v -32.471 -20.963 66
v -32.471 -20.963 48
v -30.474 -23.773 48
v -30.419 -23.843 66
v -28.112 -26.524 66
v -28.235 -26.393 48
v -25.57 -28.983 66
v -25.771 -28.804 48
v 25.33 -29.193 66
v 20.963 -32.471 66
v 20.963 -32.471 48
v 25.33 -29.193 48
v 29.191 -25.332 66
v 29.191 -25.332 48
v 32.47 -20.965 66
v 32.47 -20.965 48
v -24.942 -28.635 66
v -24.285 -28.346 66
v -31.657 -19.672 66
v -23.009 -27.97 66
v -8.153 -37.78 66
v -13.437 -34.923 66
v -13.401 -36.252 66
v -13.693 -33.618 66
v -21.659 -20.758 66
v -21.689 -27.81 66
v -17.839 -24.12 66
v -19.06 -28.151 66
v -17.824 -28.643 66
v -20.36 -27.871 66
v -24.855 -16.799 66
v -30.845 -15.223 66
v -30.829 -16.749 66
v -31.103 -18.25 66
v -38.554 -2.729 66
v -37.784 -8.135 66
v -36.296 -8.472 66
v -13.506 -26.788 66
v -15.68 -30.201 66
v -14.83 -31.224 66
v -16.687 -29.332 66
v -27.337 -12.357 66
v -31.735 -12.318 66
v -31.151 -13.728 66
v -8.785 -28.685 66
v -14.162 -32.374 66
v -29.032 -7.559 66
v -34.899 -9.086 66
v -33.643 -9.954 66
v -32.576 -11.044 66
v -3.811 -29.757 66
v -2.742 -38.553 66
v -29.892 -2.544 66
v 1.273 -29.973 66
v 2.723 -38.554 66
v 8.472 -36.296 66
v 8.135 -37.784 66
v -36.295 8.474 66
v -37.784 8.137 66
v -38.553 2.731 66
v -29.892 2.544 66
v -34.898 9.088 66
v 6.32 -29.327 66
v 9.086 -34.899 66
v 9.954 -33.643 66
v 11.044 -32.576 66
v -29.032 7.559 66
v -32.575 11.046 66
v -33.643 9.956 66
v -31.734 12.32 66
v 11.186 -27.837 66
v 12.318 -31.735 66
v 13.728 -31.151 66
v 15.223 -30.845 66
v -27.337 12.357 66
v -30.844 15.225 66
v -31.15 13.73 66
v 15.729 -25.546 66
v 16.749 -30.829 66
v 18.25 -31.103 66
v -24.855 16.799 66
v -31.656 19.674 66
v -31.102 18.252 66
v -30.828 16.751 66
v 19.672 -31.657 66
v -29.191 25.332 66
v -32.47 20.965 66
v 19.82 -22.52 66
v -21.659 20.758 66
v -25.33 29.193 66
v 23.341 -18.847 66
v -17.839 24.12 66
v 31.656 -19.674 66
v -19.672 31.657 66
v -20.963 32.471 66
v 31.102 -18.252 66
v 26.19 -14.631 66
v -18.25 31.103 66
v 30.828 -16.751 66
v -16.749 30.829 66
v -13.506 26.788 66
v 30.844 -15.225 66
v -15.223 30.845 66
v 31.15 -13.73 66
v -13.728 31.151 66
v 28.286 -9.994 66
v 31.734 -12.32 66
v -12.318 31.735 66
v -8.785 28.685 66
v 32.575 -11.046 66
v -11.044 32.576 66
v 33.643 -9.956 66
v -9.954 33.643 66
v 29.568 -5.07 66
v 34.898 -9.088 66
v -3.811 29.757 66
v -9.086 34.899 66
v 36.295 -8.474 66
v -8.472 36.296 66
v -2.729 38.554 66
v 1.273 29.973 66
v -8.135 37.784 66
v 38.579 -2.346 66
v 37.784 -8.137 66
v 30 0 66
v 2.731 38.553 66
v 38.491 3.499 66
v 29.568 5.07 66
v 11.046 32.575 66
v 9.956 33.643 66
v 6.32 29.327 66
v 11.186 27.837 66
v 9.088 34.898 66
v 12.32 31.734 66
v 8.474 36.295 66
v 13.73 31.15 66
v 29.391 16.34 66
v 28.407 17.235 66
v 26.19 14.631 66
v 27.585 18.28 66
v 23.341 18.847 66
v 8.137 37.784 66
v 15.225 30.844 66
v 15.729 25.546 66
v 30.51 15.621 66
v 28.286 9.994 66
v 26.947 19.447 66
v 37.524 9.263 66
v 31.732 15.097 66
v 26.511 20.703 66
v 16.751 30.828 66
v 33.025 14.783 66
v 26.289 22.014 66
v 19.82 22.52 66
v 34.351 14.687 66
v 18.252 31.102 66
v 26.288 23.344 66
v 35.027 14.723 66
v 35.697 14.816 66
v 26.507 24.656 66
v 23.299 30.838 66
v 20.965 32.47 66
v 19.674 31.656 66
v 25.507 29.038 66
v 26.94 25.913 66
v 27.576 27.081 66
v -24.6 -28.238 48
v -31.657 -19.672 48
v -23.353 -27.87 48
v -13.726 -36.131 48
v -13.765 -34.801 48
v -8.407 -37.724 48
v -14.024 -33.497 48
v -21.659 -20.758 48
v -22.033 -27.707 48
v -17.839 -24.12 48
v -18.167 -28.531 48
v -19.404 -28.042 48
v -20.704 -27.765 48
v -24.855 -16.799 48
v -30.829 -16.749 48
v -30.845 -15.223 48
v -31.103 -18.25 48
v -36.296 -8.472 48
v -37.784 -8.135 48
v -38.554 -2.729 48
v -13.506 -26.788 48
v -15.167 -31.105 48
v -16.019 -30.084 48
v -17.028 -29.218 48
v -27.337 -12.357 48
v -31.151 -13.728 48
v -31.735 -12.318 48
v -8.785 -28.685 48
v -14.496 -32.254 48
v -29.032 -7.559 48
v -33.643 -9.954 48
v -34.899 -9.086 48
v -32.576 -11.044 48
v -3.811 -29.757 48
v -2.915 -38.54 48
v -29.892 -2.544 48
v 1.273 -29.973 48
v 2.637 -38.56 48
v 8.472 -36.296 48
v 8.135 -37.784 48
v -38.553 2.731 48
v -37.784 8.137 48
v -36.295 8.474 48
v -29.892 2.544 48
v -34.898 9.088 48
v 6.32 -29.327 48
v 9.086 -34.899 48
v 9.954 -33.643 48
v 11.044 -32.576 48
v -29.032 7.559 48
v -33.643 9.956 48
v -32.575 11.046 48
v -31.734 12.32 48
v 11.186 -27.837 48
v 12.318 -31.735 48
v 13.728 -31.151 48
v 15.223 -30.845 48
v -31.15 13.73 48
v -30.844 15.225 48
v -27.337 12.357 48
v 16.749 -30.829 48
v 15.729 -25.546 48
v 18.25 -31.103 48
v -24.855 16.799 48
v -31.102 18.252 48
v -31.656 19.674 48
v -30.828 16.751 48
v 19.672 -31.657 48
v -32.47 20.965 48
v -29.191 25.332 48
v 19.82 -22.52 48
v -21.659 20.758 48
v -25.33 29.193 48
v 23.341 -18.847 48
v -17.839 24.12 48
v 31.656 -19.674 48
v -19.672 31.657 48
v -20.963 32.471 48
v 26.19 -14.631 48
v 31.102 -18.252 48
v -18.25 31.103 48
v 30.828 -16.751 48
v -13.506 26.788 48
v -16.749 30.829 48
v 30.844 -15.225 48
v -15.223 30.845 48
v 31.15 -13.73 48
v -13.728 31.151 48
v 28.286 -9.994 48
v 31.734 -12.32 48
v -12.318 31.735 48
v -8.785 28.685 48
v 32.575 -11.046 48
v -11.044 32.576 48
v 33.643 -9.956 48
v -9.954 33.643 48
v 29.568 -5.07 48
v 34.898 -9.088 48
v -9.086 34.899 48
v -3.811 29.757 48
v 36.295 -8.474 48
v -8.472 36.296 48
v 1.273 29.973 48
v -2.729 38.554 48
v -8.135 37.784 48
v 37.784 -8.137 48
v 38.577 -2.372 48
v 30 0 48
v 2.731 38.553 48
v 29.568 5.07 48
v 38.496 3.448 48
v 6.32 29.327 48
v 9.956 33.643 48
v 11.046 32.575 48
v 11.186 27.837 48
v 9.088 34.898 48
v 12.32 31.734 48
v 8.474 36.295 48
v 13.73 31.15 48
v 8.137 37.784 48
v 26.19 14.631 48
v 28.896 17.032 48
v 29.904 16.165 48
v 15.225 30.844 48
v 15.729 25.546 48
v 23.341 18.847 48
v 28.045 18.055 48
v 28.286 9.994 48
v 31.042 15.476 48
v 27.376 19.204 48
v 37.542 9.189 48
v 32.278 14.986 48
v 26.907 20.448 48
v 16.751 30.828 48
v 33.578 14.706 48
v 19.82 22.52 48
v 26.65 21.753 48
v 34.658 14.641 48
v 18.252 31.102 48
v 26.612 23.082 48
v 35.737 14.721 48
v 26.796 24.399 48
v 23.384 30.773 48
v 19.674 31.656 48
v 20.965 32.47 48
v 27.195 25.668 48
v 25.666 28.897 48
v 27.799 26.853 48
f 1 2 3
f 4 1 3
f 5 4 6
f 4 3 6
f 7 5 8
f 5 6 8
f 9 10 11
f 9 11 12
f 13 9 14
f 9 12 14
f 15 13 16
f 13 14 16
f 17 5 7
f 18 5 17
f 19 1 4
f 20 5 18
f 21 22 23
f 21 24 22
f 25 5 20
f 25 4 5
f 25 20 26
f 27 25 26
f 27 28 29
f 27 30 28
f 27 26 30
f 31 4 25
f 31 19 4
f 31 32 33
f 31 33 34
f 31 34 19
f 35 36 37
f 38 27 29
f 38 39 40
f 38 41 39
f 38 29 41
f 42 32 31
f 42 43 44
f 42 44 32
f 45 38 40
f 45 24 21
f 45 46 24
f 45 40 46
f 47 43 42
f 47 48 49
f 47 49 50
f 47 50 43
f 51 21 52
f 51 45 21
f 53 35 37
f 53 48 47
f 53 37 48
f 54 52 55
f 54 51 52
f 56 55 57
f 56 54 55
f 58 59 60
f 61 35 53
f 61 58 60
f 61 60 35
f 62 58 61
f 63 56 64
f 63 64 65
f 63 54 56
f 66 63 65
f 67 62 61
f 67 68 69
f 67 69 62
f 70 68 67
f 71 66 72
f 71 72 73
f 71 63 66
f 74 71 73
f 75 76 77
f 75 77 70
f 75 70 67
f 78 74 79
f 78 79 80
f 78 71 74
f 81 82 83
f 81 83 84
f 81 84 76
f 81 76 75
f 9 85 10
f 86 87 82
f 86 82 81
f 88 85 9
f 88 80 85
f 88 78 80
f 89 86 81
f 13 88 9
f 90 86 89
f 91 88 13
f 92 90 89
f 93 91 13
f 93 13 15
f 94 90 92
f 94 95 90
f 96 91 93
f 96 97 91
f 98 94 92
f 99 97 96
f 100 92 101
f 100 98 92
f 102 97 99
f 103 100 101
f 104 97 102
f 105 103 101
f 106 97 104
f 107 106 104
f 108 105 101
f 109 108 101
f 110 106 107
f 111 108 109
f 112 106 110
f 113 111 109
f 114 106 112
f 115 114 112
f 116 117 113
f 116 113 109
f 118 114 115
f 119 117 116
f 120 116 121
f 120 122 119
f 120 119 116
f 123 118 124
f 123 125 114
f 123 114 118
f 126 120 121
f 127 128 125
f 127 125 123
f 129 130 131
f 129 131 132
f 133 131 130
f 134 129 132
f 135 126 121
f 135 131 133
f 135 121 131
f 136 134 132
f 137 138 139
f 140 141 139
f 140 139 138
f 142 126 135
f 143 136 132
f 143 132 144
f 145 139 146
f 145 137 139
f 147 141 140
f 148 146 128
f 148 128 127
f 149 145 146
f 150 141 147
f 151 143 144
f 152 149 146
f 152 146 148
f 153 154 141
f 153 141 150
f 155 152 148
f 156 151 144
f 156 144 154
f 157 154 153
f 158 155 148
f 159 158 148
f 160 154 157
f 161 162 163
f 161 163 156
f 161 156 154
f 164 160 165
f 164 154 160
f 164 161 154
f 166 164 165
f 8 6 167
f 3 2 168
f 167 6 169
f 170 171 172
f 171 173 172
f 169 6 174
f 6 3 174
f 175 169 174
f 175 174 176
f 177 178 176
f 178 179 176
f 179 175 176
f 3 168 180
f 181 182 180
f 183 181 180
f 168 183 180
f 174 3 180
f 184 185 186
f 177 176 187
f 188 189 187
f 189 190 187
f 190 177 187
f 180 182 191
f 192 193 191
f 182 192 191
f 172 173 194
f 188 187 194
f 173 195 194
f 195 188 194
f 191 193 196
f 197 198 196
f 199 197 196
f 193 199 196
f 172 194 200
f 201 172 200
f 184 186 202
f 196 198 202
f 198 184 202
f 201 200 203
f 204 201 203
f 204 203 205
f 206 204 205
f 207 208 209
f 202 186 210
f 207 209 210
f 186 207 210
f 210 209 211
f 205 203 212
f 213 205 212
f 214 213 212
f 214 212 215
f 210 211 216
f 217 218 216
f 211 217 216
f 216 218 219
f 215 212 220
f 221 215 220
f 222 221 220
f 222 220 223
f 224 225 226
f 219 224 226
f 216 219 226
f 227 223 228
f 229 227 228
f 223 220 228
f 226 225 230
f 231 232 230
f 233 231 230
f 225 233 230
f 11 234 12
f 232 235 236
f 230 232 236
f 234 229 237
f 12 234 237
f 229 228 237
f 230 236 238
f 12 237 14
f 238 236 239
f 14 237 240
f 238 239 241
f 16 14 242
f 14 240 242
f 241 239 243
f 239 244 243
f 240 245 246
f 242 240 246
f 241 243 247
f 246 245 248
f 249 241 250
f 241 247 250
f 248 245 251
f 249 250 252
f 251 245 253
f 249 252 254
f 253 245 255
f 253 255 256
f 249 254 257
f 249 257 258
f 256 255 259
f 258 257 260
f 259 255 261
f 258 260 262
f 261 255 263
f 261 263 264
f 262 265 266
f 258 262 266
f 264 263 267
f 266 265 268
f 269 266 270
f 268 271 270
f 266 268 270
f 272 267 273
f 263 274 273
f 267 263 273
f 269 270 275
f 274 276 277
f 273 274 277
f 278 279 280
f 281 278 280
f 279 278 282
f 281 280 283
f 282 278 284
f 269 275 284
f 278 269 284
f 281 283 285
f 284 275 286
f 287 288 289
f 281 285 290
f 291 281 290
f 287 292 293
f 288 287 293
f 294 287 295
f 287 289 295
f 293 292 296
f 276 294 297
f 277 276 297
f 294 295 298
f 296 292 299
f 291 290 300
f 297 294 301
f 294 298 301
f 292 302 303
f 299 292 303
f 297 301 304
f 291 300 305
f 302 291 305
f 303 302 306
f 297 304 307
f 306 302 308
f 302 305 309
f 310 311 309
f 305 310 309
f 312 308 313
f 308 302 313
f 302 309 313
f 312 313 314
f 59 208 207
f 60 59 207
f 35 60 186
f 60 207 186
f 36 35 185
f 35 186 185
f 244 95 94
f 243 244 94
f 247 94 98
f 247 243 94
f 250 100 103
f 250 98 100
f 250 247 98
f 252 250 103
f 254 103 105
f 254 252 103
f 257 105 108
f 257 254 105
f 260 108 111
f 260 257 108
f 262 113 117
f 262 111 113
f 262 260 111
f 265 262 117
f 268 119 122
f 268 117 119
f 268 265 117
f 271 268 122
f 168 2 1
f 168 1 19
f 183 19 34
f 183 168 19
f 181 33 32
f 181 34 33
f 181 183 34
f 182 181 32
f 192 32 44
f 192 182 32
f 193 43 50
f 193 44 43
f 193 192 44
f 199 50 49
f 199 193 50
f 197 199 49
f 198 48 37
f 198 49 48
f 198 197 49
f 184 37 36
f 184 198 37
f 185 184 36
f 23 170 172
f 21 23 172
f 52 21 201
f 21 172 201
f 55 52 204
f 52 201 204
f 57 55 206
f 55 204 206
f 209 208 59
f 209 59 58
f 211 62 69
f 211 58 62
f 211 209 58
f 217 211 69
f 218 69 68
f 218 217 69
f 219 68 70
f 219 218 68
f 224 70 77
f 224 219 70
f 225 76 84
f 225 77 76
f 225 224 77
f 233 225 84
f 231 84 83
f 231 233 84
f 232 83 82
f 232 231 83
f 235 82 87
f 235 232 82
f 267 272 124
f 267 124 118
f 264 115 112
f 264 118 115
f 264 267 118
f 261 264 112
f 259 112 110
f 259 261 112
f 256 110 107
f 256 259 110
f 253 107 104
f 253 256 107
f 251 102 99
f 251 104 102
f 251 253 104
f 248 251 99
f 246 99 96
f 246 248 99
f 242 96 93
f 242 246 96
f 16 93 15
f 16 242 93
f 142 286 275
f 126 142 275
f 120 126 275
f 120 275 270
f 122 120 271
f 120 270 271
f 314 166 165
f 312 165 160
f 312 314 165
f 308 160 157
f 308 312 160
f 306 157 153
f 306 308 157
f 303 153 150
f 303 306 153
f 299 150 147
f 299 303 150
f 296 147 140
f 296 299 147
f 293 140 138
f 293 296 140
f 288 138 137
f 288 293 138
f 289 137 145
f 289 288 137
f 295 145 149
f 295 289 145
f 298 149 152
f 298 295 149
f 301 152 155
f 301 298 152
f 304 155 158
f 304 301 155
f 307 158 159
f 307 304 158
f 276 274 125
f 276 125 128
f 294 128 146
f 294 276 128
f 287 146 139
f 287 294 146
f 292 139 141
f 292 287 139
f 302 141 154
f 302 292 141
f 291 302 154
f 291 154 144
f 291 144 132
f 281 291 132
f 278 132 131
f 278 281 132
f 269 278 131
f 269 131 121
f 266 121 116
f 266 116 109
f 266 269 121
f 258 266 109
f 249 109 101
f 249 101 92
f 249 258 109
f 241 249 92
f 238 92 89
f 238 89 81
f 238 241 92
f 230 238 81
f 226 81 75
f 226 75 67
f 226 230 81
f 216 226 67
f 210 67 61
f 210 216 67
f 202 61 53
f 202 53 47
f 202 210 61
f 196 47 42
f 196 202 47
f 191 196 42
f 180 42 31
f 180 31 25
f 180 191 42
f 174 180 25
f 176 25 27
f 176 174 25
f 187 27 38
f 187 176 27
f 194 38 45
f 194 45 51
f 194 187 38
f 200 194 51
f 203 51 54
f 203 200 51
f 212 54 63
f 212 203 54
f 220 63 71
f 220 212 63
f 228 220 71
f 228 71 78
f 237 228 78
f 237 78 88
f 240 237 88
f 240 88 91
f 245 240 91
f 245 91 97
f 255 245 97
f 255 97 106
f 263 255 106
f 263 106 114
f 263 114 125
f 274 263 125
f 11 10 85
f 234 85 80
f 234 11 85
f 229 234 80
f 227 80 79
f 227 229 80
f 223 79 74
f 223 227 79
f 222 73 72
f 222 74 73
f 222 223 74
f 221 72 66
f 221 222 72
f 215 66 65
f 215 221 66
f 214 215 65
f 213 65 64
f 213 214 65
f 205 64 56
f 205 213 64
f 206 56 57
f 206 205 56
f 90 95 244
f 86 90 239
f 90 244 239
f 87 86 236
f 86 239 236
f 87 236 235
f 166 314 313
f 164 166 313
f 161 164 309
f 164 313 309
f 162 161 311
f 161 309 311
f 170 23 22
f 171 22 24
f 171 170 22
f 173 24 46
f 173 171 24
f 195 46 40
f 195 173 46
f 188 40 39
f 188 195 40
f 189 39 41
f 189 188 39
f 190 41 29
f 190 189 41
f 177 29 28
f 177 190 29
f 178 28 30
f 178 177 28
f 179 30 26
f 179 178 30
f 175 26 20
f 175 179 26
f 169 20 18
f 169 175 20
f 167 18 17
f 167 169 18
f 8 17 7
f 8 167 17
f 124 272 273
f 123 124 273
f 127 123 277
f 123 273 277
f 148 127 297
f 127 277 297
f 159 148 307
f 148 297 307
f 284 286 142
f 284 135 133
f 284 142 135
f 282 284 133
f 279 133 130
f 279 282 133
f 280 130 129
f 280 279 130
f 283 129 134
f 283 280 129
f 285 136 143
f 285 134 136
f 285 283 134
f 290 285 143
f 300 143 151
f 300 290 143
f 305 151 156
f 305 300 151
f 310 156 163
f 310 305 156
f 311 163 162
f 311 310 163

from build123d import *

# Parameters (mm, degrees)
CYLINDER446_R               = 8
CYLINDER446_DEPTH           = 25
CYLINDER447_R               = 8
CYLINDER447_DEPTH           = 25
CYLINDER447_PLACEMENT_ANGLE = 225
CYLINDER448_R               = 8
CYLINDER448_DEPTH           = 25
CYLINDER449_R               = 8
CYLINDER449_DEPTH           = 25
CYLINDER449_ROLL_ANGLE      = -0.500355
CYLINDER449_PITCH_ANGLE     = 0.967193
CYLINDER449_PLACEMENT_ANGLE = 144.93646
CYLINDER450_R               = 8
CYLINDER450_DEPTH           = 25
CYLINDER451_R               = 8
CYLINDER451_DEPTH           = 25
CYLINDER451_PLACEMENT_ANGLE = 45
CYLINDER444_R               = 8
CYLINDER444_DEPTH           = 25
CYLINDER444_ROLL_ANGLE      = 0.146073
CYLINDER444_PITCH_ANGLE     = 1.079101
CYLINDER444_PLACEMENT_ANGLE = -9.939308
CYLINDER445_R               = 8
CYLINDER445_DEPTH           = 25
CYLINDER445_PLACEMENT_ANGLE = 45
TUBE023_R                   = 38.65
TUBE023_R_2                 = 30
TUBE023_DEPTH               = 18


with BuildPart() as v_lec446:
    # Cylinder446 → Cylinder446 (new body)
    with BuildSketch(Plane(origin=(-38.798949, 16.072537, 43), x_dir=(0, -1, 0), z_dir=(0, 0, 1))):
        Circle(CYLINDER446_R)
    extrude(amount=CYLINDER446_DEPTH)


with BuildPart() as v_lec447:
    # Cylinder447 → Cylinder447 (new body)
    with BuildSketch(Plane.XY):
        Circle(CYLINDER447_R)
    extrude(amount=CYLINDER447_DEPTH)


with BuildPart() as v_lec447_1:
    # Cylinder447 placement: moved
    add(v_lec447.part.moved(Location((-16.07, 38.8, 43))).rotate(Axis((-16.07, 38.8, 43), (0, 0, 1)), CYLINDER447_PLACEMENT_ANGLE))


with BuildPart() as v_lec448:
    # Cylinder448 → Cylinder448 (new body)
    with BuildSketch(Plane(origin=(16.072537, 38.798949, 43), x_dir=(-1, 0, 0), z_dir=(0, 0, 1))):
        Circle(CYLINDER448_R)
    extrude(amount=CYLINDER448_DEPTH)


with BuildPart() as v_lec449:
    # Cylinder449 → Cylinder449 (new body)
    with BuildSketch(Plane.XY):
        Circle(CYLINDER449_R)
    extrude(amount=CYLINDER449_DEPTH)


with BuildPart() as v_lec449_1:
    # Cylinder449 roll: moved
    add(v_lec449.part.rotate(Axis((0, 0, 0), (1, 0, 0)), CYLINDER449_ROLL_ANGLE))


with BuildPart() as v_lec449_2:
    # Cylinder449 pitch: moved
    add(v_lec449_1.part.rotate(Axis((0, 0, 0), (0, 1, 0)), CYLINDER449_PITCH_ANGLE))


with BuildPart() as v_lec449_3:
    # Cylinder449 placement: moved
    add(v_lec449_2.part.moved(Location((34.627801, 22.637113, 43.602309))).rotate(Axis((34.627801, 22.637113, 43.602309), (0, 0, 1)), CYLINDER449_PLACEMENT_ANGLE))


with BuildPart() as v_lec450:
    # Cylinder450 → Cylinder450 (new body)
    with BuildSketch(Plane(origin=(38.798949, -16.072537, 43), x_dir=(0, 1, 0), z_dir=(0, 0, 1))):
        Circle(CYLINDER450_R)
    extrude(amount=CYLINDER450_DEPTH)


with BuildPart() as v_lec451:
    # Cylinder451 → Cylinder451 (new body)
    with BuildSketch(Plane.XY):
        Circle(CYLINDER451_R)
    extrude(amount=CYLINDER451_DEPTH)


with BuildPart() as v_lec451_1:
    # Cylinder451 placement: moved
    add(v_lec451.part.moved(Location((16.07, -38.8, 43))).rotate(Axis((16.07, -38.8, 43), (0, 0, 1)), CYLINDER451_PLACEMENT_ANGLE))


with BuildPart() as v_lec444:
    # Cylinder444 → Cylinder444 (new body)
    with BuildSketch(Plane.XY):
        Circle(CYLINDER444_R)
    extrude(amount=CYLINDER444_DEPTH)


with BuildPart() as v_lec444_1:
    # Cylinder444 roll: moved
    add(v_lec444.part.rotate(Axis((0, 0, 0), (1, 0, 0)), CYLINDER444_ROLL_ANGLE))


with BuildPart() as v_lec444_2:
    # Cylinder444 pitch: moved
    add(v_lec444_1.part.rotate(Axis((0, 0, 0), (0, 1, 0)), CYLINDER444_PITCH_ANGLE))


with BuildPart() as v_lec444_3:
    # Cylinder444 placement: moved
    add(v_lec444_2.part.moved(Location((-21.748471, -35.690226, 43.196026))).rotate(Axis((-21.748471, -35.690226, 43.196026), (0, 0, 1)), CYLINDER444_PLACEMENT_ANGLE))


with BuildPart() as compound325:
    # Cylinder445 → Cylinder445 (new body)
    with BuildSketch(Plane.XY):
        Circle(CYLINDER445_R)
    extrude(amount=CYLINDER445_DEPTH)


with BuildPart() as compound325_1:
    # Cylinder445 placement: moved
    add(compound325.part.moved(Location((-38.8, -16.07, 43))).rotate(Axis((-38.8, -16.07, 43), (0, 0, -1)), CYLINDER445_PLACEMENT_ANGLE))

    # Compound325: union Válec446, Válec447, Válec448, Válec449, Válec450, Válec451, Válec444
    add(v_lec446.part)
    add(v_lec447_1.part)
    add(v_lec448.part)
    add(v_lec449_3.part)
    add(v_lec450.part)
    add(v_lec451_1.part)
    add(v_lec444_3.part)


with BuildPart() as compound325_2:
    # Compound325 placement: moved
    add(compound325_1.part.moved(Location((0, 0, 3))))


with BuildPart() as cut:
    # Tube023 → Tube023 (new body)
    with BuildSketch(Plane.XY.offset(48)):
        Circle(TUBE023_R)
        Circle(TUBE023_R_2, mode=Mode.SUBTRACT)
    extrude(amount=TUBE023_DEPTH)

    # Cut: cut Compound325
    add(compound325_2.part, mode=Mode.SUBTRACT)


solid = cut.part
